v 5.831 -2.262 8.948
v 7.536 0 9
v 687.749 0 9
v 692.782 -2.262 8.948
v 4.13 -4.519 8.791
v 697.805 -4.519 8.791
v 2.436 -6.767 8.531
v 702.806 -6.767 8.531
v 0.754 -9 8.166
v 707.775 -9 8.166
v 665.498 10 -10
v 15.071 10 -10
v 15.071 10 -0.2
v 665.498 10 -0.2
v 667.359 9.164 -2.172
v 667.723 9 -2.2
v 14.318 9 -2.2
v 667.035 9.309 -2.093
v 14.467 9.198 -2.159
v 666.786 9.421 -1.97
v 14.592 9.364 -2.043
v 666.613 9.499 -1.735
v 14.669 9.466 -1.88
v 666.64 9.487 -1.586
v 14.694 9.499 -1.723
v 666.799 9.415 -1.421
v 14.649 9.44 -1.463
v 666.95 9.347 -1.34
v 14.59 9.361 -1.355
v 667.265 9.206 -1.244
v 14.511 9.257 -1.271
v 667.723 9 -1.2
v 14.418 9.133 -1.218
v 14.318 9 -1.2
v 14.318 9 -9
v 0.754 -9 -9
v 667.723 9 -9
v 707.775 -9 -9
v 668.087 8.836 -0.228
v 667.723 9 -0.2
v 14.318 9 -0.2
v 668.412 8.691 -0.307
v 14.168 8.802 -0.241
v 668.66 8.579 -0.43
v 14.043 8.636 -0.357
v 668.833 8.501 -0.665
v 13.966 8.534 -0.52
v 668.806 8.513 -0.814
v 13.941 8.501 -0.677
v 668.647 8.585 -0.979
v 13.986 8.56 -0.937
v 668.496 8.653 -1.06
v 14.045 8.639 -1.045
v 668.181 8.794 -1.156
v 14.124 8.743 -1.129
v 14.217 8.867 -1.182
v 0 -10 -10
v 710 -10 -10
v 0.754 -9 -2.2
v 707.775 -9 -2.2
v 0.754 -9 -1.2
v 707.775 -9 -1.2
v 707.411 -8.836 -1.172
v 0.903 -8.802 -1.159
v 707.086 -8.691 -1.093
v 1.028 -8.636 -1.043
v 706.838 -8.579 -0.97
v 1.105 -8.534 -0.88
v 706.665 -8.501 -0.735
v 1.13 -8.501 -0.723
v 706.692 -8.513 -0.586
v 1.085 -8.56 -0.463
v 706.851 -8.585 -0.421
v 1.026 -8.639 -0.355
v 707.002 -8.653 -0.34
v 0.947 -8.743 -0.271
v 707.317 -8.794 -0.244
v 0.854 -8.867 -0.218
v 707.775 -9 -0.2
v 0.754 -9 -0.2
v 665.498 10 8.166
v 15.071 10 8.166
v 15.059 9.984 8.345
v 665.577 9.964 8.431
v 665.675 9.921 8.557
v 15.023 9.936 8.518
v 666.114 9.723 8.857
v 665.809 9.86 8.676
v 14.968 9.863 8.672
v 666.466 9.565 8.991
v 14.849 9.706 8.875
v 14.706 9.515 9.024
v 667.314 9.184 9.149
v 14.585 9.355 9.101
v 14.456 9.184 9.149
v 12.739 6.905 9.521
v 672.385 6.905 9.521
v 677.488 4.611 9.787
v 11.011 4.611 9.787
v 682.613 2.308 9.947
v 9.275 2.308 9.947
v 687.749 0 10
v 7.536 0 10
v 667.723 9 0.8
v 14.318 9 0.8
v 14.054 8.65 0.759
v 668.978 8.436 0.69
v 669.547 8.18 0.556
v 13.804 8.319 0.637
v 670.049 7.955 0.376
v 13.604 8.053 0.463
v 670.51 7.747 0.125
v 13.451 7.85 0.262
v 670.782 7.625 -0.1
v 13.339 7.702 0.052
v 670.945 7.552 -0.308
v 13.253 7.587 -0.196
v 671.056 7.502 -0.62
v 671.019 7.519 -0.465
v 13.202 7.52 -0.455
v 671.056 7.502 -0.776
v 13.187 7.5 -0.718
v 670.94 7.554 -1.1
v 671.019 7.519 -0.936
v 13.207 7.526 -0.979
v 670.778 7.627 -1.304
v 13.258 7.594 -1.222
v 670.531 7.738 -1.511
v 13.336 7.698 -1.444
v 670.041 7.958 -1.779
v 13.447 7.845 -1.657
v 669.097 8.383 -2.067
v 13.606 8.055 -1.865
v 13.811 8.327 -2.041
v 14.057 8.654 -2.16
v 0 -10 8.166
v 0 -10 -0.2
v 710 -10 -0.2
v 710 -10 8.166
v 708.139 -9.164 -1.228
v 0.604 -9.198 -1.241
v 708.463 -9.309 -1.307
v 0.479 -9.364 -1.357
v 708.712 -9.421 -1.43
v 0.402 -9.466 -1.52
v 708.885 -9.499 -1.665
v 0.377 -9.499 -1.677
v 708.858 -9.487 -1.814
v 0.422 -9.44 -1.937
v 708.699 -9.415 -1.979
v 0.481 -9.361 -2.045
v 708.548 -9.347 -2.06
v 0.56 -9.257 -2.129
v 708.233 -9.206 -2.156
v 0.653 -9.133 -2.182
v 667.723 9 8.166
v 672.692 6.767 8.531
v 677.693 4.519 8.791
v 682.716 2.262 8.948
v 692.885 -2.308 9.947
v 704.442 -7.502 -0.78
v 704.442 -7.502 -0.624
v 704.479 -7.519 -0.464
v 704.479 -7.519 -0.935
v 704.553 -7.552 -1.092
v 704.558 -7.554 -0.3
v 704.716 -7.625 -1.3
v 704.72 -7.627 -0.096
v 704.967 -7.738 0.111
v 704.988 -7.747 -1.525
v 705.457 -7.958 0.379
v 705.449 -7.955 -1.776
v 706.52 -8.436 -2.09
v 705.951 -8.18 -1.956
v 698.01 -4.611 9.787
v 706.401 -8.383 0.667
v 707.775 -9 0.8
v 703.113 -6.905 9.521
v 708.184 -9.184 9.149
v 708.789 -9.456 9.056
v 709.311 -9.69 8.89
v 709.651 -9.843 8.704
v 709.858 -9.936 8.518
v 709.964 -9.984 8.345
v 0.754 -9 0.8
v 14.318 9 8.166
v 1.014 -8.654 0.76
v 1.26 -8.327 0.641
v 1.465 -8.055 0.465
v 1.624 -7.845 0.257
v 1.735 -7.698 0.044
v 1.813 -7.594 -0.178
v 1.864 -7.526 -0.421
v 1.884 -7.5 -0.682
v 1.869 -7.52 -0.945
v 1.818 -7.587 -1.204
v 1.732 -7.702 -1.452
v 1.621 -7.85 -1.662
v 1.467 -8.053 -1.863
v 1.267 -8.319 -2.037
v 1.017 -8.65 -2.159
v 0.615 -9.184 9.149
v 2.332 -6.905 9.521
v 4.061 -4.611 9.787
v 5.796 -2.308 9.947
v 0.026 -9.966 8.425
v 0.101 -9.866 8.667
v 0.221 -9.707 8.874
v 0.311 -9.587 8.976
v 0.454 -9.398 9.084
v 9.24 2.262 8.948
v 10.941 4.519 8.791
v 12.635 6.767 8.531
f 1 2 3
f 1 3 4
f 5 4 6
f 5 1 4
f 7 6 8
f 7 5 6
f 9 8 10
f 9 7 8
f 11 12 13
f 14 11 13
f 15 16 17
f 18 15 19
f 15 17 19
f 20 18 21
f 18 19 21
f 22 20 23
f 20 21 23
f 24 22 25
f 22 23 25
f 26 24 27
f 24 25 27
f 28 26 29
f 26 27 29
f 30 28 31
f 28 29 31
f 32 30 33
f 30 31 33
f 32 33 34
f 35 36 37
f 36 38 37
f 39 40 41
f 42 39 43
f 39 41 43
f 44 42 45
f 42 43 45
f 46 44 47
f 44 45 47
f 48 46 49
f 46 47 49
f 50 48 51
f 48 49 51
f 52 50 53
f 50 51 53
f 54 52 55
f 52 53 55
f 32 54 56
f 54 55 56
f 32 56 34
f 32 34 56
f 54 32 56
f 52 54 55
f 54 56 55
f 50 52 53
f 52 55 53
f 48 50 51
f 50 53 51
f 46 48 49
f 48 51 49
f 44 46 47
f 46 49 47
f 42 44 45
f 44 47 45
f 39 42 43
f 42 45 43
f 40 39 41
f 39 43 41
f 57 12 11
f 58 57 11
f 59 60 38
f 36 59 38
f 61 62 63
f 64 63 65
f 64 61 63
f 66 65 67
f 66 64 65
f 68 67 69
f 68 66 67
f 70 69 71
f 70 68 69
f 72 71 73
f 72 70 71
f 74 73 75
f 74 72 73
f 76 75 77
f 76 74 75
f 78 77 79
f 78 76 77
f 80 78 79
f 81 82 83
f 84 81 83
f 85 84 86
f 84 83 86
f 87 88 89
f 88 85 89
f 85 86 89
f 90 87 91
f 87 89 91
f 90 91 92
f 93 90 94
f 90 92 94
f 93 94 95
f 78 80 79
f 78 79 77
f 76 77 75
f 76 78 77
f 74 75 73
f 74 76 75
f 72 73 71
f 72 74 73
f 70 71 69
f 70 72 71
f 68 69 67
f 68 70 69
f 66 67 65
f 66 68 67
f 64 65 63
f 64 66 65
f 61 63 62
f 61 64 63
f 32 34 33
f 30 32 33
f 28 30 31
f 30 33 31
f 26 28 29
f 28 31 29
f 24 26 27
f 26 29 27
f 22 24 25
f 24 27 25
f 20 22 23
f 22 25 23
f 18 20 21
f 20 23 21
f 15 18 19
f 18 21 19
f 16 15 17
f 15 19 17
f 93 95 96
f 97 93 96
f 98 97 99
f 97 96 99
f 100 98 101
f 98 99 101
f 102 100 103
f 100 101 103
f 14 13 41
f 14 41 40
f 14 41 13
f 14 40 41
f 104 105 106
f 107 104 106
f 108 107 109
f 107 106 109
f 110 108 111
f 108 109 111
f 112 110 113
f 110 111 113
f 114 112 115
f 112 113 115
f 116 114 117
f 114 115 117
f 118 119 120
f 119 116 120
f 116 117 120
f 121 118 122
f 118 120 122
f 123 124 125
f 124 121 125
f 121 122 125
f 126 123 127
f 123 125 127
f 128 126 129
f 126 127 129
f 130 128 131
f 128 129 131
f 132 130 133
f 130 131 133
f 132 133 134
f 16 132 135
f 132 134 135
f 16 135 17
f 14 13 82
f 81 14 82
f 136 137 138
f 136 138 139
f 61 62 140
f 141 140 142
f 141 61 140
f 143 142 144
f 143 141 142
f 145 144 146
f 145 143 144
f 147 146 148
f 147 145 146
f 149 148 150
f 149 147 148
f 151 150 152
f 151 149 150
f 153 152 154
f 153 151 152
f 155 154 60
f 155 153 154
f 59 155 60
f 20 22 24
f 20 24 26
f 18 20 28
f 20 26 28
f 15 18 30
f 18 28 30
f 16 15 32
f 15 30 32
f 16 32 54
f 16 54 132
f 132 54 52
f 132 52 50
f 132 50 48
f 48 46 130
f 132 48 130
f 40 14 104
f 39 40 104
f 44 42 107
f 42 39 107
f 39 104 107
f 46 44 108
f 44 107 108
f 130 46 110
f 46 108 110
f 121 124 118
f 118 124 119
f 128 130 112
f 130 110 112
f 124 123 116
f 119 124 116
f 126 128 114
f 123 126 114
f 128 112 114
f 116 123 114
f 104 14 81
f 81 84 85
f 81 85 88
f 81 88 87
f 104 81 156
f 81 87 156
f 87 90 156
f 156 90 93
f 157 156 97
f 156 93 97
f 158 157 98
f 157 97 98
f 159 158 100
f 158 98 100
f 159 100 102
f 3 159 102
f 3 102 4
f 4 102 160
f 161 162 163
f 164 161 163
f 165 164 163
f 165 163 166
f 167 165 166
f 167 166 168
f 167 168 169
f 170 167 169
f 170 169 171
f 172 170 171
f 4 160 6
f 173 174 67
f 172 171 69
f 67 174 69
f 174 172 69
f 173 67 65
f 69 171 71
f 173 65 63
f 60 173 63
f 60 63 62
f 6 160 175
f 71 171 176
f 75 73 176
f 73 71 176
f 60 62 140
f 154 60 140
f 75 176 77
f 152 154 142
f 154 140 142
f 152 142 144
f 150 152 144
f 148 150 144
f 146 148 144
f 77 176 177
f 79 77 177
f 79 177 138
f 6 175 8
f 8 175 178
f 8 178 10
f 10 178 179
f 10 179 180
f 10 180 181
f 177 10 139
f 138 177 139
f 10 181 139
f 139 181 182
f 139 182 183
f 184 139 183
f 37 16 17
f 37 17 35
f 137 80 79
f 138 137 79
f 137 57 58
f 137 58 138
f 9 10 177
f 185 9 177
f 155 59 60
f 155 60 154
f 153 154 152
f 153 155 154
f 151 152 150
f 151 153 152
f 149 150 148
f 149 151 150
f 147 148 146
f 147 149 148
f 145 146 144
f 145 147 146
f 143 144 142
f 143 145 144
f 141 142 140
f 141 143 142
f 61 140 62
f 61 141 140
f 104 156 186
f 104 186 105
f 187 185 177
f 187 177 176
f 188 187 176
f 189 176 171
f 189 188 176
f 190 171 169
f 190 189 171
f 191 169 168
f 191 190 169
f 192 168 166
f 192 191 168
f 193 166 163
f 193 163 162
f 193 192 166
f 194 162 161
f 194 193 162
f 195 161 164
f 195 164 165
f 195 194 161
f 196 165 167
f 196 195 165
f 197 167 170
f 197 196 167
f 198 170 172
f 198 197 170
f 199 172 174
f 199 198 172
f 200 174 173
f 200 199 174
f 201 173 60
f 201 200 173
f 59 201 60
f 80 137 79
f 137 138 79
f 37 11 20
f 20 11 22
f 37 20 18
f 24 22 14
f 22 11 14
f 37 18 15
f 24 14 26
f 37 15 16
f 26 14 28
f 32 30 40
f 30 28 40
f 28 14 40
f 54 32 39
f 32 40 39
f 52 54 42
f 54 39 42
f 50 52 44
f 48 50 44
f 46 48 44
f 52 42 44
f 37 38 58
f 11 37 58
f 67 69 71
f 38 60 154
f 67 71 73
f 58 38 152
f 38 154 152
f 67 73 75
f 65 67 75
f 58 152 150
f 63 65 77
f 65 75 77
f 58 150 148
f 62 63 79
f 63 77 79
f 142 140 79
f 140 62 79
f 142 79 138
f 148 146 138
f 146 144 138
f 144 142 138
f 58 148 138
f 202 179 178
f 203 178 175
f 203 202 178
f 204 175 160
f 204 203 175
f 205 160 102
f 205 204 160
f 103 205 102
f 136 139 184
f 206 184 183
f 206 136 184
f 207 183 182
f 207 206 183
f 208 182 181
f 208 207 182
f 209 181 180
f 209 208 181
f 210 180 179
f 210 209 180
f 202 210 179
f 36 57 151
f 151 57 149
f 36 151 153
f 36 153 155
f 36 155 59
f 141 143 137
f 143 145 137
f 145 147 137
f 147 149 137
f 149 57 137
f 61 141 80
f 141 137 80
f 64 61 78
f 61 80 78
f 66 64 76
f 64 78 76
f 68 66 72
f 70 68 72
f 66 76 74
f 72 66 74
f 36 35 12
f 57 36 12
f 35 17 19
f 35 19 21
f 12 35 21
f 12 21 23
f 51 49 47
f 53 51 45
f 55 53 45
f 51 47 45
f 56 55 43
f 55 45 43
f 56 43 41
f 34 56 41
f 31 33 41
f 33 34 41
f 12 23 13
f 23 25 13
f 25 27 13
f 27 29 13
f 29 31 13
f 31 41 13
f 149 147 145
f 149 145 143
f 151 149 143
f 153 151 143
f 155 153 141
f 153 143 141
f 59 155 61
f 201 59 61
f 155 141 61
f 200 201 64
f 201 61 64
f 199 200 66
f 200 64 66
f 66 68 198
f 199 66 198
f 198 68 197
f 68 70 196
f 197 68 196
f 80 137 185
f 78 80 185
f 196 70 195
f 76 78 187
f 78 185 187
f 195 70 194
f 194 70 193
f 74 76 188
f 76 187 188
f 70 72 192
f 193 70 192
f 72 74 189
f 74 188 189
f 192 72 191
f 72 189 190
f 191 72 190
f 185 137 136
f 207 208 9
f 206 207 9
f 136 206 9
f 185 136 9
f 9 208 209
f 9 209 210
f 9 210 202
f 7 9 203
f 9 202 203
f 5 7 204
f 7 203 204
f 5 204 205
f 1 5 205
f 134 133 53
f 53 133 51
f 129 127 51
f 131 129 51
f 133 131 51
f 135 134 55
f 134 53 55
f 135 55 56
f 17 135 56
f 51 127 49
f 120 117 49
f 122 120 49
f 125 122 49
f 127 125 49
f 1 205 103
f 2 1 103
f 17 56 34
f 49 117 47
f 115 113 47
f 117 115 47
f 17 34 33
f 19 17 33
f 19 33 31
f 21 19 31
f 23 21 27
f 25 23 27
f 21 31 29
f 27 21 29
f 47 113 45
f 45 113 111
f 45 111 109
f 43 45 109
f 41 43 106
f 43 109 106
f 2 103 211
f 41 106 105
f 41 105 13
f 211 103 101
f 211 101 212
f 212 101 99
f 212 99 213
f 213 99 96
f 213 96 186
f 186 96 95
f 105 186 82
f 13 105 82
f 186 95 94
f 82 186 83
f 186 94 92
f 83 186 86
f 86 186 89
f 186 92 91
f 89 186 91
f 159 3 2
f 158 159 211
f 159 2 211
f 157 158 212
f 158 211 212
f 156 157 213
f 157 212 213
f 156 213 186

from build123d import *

# Parameters (mm, degrees)
F2_DEPTH      = 1000
F4_DEPTH      = 1000
F8_DEPTH      = 10.001
F8_DEPTH_BACK = 10.001


# Not quite as in the source:
# - ends of sketch curves that miss each other by under 0.0002 mm in the source are joined


with BuildPart() as f2:
    # F1 (on Right) → F2 (new body)
    with BuildSketch(Plane.YZ):
        with BuildLine():
            Line((0, -9), (0, -10))
            Line((0, -10), (10, -10))
            Line((10, -10), (10, -0.2))
            Line((10, -0.2), (9, -0.2))
            ThreePointArc((9, -0.2), (8.5, -0.7), (9, -1.2))
            ThreePointArc((9, -1.2), (9.5, -1.7), (9, -2.2))
            Line((9, -2.2), (9, -9))
            Line((9, -9), (0, -9))
        make_face()
    extrude(amount=F2_DEPTH)

    # F5: F2 across plane


with BuildPart() as f4:
    # F3 (on Right) → F4 (new body)
    with BuildSketch(Plane.YZ):
        with BuildLine():
            Line((9, -0.2), (10, -0.2))
            Line((10, -0.2), (10, 8.1663783152))
            ThreePointArc((10, 8.1663783152), (9.7693092582, 8.8052548802), (9.1836734694, 9.1493656277))
            ThreePointArc((9.1836734694, 9.1493656277), (4.6114920912, 9.7868872364), (0, 10))
            Line((0, 10), (0, 9))
            ThreePointArc((0, 9), (4.5192622493, 8.7911494917), (9, 8.1663783152))
            Line((9, 8.1663783152), (9, 0.8))
            ThreePointArc((9, 0.8), (7.5, -0.7), (9, -2.2))
            ThreePointArc((9, -2.2), (9.5, -1.7), (9, -1.2))
            ThreePointArc((9, -1.2), (8.5, -0.7), (9, -0.2))
        make_face()
    extrude(amount=F4_DEPTH)

    # F6: F4 across plane


with BuildPart() as f2_1:
    add(f2.part)
    add(f2.part.mirror(Plane.XZ))


with BuildPart() as f4_1:
    add(f4.part)
    add(f4.part.mirror(Plane.XZ))


with BuildPart() as f8_tool:
    # F7 (on Top) → F8 (new body, two sides)
    with BuildSketch(Plane.XY) as f8_sk:
        Polygon((0, 10), (0, 0), (0, -10), (15.0710810021, 10), align=None)
        Polygon((665.4979817736, 10), (710, -10), (1016.9613361359, -10), (1016.9613361359, 10), (709.9114895723, 10), align=None)
    extrude(amount=F8_DEPTH)
    extrude(f8_sk.sketch, amount=-F8_DEPTH_BACK)


with BuildPart() as f2_2:
    add(f2_1.part)

    # F8: cut by f8_tool
    add(f8_tool.part, mode=Mode.SUBTRACT)


with BuildPart() as f4_2:
    add(f4_1.part)

    # F8: cut by f8_tool
    add(f8_tool.part, mode=Mode.SUBTRACT)


solid = Compound([f2_2.part, f4_2.part])
